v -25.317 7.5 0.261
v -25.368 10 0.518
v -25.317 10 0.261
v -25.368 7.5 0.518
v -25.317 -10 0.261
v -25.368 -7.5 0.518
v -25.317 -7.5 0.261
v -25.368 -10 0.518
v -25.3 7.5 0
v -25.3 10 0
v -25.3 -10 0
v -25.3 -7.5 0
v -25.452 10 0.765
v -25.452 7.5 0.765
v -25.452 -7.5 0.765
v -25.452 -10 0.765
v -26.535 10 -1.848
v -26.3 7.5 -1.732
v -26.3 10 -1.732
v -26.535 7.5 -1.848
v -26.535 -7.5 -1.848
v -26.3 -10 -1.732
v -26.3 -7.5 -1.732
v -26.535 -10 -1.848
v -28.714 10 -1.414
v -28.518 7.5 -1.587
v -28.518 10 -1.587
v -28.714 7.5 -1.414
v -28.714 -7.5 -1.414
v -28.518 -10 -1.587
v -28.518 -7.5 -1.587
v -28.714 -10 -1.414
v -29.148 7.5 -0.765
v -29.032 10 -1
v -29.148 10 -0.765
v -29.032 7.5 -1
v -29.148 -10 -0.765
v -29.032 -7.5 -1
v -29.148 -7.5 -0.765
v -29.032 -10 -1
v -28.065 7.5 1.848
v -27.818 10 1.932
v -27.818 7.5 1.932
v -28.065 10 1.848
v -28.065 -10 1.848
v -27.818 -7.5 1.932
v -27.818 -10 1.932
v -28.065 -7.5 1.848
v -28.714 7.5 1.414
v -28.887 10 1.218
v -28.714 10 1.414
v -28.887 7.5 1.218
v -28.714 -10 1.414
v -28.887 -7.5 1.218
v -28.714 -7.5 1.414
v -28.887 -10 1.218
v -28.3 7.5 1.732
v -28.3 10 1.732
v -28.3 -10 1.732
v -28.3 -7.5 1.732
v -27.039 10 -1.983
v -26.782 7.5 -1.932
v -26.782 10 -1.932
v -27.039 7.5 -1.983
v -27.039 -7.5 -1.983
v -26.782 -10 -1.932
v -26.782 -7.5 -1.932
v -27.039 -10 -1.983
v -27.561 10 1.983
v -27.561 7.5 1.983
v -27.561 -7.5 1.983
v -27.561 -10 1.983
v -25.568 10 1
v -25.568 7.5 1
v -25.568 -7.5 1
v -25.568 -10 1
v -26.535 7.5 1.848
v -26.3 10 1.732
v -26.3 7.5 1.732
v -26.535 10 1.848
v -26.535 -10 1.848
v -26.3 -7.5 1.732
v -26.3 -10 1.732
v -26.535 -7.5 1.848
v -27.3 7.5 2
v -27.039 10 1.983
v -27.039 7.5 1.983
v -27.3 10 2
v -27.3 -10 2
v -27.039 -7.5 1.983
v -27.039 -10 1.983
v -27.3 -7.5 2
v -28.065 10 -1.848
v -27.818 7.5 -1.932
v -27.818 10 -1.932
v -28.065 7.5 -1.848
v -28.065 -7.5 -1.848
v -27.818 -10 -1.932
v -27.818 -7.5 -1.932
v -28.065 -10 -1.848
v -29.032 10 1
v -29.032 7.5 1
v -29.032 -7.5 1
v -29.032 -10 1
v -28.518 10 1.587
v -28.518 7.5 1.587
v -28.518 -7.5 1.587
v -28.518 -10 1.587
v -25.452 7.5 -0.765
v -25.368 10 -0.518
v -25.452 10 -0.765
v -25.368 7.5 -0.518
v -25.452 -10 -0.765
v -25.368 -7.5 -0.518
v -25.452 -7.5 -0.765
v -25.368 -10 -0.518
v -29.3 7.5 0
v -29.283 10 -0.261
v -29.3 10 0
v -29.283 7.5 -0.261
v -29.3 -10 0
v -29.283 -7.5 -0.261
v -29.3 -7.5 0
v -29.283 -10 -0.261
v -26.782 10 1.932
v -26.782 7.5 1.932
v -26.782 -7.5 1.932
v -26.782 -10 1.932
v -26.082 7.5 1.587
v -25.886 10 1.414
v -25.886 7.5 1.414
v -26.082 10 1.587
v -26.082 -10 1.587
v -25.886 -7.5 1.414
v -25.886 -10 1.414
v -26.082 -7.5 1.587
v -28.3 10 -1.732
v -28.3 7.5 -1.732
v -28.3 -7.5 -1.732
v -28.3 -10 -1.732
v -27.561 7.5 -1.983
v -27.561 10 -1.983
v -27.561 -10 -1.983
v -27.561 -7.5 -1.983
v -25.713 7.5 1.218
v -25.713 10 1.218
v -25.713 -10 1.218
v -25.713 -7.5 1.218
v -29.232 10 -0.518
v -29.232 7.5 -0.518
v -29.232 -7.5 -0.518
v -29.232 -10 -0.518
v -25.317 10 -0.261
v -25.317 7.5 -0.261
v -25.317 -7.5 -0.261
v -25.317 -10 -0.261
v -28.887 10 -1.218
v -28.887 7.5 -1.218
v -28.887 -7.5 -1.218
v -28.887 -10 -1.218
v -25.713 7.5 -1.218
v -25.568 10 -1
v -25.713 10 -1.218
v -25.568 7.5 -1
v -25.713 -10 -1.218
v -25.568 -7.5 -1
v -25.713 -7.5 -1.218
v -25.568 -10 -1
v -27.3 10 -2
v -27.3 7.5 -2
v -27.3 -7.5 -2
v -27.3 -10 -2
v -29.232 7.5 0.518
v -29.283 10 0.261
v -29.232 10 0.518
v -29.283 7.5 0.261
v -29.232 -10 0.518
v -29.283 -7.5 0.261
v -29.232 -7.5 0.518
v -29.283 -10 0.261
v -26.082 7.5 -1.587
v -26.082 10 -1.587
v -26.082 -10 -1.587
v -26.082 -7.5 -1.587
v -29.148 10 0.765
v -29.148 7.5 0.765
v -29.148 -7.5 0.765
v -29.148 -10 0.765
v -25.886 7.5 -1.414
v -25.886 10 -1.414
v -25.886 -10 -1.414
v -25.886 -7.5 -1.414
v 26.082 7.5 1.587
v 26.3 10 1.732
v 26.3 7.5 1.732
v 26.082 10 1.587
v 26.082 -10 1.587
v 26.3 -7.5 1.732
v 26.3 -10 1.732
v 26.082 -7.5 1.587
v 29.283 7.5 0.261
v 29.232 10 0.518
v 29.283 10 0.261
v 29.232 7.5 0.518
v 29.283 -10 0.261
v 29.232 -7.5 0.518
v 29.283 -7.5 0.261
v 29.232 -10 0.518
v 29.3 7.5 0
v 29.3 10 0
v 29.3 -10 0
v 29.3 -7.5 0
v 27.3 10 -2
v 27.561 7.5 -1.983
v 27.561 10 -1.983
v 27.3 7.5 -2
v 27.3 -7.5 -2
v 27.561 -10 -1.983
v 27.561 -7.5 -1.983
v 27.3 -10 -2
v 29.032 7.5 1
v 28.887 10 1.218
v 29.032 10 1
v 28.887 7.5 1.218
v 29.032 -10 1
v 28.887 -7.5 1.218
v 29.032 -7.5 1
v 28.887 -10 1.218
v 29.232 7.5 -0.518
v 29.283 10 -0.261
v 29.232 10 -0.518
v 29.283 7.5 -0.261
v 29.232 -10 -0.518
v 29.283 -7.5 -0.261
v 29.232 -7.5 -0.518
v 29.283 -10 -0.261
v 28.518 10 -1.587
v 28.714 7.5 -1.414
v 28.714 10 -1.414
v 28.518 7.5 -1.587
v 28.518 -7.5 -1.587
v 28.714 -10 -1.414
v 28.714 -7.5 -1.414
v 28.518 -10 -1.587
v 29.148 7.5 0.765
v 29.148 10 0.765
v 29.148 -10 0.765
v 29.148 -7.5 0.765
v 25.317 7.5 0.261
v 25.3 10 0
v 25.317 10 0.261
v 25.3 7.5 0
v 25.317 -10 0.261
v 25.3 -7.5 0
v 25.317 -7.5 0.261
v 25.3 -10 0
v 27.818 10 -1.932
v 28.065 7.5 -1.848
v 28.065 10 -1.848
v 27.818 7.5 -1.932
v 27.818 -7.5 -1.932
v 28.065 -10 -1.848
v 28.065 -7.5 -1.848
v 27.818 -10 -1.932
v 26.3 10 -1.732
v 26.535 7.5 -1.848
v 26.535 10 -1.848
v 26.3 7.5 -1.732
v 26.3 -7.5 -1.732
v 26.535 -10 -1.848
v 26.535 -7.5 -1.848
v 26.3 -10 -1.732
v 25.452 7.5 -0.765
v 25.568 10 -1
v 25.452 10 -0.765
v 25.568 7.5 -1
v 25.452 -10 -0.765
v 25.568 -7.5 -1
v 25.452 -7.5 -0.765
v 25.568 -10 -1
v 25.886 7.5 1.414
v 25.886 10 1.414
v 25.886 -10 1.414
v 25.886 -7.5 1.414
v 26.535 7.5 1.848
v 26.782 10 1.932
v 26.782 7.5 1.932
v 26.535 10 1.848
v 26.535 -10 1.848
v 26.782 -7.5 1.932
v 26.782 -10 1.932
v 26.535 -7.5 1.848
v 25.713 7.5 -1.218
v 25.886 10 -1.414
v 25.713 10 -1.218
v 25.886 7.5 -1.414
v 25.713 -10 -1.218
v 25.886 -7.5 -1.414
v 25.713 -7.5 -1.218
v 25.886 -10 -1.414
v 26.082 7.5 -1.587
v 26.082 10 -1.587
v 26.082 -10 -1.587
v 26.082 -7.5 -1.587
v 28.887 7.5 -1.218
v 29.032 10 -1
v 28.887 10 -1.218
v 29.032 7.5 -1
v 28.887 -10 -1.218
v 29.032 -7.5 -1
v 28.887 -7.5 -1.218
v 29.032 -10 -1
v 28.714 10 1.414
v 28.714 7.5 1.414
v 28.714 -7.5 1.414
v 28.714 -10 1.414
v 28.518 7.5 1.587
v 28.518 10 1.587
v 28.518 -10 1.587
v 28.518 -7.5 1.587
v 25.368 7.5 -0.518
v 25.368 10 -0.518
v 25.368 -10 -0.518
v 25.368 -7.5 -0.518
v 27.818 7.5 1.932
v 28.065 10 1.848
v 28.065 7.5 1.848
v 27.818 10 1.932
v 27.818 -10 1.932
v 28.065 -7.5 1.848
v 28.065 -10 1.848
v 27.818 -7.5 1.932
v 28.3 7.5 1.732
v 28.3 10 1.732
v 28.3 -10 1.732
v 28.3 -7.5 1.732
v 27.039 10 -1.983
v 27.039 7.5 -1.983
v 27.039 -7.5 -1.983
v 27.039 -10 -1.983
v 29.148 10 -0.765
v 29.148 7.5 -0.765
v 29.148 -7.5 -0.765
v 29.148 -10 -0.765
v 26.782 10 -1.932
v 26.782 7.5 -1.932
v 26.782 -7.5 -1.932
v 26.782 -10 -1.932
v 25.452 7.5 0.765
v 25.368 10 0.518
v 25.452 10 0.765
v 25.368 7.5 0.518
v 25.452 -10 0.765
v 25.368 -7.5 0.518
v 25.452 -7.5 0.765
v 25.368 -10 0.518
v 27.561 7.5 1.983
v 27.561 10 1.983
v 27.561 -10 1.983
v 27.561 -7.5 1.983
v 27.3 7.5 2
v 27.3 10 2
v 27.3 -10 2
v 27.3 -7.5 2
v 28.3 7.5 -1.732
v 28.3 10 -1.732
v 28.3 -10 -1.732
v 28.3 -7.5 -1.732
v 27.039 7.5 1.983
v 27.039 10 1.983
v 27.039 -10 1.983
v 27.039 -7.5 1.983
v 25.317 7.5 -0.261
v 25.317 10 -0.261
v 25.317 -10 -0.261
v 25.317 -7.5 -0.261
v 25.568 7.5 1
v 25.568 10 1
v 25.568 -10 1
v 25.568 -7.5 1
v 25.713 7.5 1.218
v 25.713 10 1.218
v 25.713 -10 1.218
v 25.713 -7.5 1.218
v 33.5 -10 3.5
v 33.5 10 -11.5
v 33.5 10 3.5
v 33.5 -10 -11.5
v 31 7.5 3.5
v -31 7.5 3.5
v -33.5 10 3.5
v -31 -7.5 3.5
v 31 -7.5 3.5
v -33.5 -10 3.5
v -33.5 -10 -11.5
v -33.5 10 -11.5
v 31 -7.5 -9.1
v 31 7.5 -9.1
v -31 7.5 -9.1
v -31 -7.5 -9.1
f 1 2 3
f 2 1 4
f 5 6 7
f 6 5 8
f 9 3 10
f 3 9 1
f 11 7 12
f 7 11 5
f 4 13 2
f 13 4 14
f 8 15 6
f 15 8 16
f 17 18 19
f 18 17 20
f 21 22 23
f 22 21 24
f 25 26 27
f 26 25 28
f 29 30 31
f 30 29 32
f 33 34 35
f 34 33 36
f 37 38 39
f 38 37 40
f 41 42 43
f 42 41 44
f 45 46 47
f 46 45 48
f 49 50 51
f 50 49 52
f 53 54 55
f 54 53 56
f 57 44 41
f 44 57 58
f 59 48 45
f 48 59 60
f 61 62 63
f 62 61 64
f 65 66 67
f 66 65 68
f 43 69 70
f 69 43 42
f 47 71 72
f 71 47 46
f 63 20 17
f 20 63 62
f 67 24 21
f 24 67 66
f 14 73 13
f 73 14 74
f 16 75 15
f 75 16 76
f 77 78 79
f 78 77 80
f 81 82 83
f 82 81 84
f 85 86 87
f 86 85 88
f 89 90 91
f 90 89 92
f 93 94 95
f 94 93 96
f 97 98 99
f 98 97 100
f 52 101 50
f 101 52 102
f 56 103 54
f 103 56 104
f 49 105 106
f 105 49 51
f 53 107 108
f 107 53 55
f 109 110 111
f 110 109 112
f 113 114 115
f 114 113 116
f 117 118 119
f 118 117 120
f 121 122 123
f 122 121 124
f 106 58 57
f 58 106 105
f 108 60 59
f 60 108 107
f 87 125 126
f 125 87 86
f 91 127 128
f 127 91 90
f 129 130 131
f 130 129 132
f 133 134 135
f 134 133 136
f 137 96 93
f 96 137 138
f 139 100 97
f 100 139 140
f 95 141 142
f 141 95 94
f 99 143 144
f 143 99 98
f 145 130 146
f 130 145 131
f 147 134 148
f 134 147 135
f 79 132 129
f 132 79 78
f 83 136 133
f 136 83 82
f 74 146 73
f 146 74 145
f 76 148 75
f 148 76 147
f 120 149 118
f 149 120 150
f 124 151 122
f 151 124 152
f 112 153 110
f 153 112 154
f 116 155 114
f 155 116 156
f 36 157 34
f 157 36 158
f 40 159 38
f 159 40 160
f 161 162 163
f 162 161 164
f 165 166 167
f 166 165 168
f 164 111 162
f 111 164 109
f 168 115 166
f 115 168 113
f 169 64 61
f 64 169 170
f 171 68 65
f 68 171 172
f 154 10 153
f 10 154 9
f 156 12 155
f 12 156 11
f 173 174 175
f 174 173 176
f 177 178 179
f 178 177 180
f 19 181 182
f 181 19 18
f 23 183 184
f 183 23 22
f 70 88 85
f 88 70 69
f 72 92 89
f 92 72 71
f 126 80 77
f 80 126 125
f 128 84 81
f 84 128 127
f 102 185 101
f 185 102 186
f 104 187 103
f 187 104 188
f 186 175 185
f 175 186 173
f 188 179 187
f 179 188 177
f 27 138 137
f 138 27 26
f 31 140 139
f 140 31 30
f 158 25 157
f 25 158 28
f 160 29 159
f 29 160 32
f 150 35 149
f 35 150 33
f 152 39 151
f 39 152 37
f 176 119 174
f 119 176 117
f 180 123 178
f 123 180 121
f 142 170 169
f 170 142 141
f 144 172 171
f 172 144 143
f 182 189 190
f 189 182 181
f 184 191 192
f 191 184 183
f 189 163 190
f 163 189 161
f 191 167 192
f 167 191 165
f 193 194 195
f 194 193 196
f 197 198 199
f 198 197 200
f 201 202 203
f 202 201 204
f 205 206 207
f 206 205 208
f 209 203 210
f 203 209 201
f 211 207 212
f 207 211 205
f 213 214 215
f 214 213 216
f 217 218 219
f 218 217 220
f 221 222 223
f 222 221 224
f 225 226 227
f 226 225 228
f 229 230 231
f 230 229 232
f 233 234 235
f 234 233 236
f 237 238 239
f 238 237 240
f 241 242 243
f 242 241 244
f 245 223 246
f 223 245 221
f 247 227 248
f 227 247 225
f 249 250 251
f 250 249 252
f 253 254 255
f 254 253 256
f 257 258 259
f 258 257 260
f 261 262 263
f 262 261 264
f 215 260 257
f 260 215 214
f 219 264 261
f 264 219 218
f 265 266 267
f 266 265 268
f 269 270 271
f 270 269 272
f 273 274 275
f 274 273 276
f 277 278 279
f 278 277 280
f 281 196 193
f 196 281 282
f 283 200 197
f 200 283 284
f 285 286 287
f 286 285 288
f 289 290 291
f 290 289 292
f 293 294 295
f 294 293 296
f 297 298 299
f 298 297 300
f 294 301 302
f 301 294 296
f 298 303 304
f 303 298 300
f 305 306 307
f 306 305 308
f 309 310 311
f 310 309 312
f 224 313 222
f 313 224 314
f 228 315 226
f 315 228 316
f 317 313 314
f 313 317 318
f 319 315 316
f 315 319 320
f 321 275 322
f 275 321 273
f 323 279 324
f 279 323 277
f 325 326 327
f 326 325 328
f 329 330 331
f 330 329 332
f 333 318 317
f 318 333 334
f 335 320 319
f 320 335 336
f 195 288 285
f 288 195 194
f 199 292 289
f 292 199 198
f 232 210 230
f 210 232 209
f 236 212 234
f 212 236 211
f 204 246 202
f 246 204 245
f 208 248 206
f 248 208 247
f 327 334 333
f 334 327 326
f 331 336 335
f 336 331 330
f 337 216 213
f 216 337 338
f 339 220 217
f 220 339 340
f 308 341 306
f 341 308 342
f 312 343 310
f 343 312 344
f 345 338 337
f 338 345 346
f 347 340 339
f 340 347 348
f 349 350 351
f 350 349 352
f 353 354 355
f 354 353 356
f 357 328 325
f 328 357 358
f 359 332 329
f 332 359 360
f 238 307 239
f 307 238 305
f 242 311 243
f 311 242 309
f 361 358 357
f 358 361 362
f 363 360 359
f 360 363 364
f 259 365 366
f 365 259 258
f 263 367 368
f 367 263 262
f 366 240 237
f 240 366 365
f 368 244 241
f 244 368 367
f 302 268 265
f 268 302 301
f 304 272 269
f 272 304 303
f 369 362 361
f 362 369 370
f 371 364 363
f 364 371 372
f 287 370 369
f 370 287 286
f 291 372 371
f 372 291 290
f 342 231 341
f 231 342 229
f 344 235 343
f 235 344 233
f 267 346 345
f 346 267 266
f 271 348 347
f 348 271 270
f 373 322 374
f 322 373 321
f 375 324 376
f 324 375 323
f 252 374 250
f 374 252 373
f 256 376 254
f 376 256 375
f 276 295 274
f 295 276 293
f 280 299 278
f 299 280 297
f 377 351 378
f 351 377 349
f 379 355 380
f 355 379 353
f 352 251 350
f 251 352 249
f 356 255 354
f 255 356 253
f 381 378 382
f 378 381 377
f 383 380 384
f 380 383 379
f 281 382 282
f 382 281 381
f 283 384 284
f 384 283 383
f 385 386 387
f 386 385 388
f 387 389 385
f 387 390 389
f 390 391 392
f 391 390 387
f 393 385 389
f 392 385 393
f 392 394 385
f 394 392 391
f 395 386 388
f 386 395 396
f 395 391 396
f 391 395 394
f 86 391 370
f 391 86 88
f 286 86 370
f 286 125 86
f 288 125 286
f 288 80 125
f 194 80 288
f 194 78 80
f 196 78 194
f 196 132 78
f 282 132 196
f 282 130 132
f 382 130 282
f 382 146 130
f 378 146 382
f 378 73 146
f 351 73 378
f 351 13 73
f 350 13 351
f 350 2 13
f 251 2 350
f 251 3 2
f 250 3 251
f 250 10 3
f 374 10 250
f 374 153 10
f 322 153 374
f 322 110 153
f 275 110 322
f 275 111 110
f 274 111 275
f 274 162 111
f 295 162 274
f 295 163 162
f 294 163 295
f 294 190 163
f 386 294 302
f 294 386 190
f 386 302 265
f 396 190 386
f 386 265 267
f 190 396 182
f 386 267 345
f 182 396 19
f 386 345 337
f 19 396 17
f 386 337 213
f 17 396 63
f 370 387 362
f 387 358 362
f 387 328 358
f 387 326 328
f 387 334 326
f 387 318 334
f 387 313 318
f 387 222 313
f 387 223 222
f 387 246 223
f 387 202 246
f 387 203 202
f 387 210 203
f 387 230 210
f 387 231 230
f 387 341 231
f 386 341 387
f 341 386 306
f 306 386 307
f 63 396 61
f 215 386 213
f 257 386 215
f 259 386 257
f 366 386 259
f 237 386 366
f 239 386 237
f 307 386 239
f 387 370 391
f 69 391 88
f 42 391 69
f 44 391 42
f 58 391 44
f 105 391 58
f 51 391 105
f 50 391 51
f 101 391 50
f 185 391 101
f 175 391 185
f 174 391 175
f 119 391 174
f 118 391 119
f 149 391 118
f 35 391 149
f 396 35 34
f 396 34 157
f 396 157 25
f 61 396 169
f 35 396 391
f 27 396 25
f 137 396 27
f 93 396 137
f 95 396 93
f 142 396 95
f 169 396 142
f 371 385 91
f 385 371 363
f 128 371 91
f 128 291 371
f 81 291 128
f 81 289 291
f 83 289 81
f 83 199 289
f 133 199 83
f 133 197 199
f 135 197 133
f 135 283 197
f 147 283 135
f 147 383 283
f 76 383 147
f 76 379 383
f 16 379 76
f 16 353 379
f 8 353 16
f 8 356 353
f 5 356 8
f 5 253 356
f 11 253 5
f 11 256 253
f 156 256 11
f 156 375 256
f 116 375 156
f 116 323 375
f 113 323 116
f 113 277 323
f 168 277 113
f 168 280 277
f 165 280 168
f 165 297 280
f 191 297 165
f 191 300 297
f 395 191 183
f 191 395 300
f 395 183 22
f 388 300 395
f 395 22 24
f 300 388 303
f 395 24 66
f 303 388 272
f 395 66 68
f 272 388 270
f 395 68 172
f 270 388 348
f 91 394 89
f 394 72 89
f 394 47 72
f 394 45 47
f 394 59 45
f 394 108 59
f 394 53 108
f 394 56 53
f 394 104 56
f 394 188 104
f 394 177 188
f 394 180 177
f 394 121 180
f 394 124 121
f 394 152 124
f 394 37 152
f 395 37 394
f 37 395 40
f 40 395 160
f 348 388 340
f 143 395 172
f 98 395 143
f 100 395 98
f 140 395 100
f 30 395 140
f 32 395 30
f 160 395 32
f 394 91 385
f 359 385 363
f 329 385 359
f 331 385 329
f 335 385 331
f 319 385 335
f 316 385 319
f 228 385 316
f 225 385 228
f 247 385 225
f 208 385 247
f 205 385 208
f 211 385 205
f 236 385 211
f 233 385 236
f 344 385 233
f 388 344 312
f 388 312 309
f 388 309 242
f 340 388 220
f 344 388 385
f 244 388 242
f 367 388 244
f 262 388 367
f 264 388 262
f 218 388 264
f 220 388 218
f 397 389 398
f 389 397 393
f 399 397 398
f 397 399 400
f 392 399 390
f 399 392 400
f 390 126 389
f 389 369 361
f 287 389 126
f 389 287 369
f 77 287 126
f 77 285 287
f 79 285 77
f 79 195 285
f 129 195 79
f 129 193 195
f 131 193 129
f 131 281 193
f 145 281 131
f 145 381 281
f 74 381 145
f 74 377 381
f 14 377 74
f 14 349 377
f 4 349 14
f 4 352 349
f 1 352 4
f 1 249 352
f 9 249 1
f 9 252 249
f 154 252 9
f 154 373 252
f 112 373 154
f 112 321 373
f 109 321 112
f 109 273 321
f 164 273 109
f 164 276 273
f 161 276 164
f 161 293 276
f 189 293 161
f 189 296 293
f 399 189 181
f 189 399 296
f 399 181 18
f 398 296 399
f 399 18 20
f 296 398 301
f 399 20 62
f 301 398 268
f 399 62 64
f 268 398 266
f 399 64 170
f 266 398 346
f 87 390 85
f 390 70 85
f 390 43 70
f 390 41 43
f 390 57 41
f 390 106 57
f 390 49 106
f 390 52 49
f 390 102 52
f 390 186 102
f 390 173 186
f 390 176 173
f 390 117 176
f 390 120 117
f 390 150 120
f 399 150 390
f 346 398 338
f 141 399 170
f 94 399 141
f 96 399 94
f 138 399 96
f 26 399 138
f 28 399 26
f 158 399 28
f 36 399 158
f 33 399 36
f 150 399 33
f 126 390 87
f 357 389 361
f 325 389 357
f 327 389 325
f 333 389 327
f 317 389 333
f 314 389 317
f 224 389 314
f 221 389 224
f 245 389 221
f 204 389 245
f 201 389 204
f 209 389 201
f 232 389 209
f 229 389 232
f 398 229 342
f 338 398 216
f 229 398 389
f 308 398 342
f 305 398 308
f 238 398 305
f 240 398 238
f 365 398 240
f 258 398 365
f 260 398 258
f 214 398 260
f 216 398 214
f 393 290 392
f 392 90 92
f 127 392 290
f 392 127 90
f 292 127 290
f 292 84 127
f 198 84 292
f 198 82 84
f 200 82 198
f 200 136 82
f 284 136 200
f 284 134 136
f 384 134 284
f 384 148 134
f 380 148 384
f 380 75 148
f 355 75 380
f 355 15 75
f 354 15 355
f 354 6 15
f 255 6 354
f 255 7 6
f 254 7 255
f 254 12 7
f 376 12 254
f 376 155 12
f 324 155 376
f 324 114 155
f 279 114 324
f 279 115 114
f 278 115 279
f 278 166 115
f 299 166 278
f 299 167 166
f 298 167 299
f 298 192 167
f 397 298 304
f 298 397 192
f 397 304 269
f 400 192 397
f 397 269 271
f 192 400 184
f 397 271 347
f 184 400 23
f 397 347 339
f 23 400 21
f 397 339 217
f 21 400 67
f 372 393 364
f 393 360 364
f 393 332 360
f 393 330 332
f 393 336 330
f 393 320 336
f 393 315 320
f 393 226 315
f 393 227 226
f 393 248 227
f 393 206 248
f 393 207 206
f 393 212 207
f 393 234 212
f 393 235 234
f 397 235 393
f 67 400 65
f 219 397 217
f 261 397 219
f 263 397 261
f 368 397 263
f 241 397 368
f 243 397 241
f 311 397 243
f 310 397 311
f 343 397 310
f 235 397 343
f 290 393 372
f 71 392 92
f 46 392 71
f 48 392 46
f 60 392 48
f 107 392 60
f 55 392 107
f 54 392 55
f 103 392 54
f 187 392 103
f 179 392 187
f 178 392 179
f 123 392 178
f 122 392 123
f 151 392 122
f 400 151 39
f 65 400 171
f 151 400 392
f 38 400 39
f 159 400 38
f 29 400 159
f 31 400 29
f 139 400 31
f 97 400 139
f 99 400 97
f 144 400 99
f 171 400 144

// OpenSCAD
$fn=48;
*translate([-1,0,0]) rotate([0,90,0]){
  cylinder(d=14,h=48.3,center=true);
  translate([0,0,48.3/2]) cylinder(d=4,h=2);
}
difference(){
  translate([0,0,-4]) cube([67,20,15],true);
  for (ix=[-1,1])
    translate([ix*27.3,0,0]) rotate([90,0,0]) cylinder(d=4,h=22,center=true);
  translate([0,0,-2]) cube([62,15,14.2],true);
}
